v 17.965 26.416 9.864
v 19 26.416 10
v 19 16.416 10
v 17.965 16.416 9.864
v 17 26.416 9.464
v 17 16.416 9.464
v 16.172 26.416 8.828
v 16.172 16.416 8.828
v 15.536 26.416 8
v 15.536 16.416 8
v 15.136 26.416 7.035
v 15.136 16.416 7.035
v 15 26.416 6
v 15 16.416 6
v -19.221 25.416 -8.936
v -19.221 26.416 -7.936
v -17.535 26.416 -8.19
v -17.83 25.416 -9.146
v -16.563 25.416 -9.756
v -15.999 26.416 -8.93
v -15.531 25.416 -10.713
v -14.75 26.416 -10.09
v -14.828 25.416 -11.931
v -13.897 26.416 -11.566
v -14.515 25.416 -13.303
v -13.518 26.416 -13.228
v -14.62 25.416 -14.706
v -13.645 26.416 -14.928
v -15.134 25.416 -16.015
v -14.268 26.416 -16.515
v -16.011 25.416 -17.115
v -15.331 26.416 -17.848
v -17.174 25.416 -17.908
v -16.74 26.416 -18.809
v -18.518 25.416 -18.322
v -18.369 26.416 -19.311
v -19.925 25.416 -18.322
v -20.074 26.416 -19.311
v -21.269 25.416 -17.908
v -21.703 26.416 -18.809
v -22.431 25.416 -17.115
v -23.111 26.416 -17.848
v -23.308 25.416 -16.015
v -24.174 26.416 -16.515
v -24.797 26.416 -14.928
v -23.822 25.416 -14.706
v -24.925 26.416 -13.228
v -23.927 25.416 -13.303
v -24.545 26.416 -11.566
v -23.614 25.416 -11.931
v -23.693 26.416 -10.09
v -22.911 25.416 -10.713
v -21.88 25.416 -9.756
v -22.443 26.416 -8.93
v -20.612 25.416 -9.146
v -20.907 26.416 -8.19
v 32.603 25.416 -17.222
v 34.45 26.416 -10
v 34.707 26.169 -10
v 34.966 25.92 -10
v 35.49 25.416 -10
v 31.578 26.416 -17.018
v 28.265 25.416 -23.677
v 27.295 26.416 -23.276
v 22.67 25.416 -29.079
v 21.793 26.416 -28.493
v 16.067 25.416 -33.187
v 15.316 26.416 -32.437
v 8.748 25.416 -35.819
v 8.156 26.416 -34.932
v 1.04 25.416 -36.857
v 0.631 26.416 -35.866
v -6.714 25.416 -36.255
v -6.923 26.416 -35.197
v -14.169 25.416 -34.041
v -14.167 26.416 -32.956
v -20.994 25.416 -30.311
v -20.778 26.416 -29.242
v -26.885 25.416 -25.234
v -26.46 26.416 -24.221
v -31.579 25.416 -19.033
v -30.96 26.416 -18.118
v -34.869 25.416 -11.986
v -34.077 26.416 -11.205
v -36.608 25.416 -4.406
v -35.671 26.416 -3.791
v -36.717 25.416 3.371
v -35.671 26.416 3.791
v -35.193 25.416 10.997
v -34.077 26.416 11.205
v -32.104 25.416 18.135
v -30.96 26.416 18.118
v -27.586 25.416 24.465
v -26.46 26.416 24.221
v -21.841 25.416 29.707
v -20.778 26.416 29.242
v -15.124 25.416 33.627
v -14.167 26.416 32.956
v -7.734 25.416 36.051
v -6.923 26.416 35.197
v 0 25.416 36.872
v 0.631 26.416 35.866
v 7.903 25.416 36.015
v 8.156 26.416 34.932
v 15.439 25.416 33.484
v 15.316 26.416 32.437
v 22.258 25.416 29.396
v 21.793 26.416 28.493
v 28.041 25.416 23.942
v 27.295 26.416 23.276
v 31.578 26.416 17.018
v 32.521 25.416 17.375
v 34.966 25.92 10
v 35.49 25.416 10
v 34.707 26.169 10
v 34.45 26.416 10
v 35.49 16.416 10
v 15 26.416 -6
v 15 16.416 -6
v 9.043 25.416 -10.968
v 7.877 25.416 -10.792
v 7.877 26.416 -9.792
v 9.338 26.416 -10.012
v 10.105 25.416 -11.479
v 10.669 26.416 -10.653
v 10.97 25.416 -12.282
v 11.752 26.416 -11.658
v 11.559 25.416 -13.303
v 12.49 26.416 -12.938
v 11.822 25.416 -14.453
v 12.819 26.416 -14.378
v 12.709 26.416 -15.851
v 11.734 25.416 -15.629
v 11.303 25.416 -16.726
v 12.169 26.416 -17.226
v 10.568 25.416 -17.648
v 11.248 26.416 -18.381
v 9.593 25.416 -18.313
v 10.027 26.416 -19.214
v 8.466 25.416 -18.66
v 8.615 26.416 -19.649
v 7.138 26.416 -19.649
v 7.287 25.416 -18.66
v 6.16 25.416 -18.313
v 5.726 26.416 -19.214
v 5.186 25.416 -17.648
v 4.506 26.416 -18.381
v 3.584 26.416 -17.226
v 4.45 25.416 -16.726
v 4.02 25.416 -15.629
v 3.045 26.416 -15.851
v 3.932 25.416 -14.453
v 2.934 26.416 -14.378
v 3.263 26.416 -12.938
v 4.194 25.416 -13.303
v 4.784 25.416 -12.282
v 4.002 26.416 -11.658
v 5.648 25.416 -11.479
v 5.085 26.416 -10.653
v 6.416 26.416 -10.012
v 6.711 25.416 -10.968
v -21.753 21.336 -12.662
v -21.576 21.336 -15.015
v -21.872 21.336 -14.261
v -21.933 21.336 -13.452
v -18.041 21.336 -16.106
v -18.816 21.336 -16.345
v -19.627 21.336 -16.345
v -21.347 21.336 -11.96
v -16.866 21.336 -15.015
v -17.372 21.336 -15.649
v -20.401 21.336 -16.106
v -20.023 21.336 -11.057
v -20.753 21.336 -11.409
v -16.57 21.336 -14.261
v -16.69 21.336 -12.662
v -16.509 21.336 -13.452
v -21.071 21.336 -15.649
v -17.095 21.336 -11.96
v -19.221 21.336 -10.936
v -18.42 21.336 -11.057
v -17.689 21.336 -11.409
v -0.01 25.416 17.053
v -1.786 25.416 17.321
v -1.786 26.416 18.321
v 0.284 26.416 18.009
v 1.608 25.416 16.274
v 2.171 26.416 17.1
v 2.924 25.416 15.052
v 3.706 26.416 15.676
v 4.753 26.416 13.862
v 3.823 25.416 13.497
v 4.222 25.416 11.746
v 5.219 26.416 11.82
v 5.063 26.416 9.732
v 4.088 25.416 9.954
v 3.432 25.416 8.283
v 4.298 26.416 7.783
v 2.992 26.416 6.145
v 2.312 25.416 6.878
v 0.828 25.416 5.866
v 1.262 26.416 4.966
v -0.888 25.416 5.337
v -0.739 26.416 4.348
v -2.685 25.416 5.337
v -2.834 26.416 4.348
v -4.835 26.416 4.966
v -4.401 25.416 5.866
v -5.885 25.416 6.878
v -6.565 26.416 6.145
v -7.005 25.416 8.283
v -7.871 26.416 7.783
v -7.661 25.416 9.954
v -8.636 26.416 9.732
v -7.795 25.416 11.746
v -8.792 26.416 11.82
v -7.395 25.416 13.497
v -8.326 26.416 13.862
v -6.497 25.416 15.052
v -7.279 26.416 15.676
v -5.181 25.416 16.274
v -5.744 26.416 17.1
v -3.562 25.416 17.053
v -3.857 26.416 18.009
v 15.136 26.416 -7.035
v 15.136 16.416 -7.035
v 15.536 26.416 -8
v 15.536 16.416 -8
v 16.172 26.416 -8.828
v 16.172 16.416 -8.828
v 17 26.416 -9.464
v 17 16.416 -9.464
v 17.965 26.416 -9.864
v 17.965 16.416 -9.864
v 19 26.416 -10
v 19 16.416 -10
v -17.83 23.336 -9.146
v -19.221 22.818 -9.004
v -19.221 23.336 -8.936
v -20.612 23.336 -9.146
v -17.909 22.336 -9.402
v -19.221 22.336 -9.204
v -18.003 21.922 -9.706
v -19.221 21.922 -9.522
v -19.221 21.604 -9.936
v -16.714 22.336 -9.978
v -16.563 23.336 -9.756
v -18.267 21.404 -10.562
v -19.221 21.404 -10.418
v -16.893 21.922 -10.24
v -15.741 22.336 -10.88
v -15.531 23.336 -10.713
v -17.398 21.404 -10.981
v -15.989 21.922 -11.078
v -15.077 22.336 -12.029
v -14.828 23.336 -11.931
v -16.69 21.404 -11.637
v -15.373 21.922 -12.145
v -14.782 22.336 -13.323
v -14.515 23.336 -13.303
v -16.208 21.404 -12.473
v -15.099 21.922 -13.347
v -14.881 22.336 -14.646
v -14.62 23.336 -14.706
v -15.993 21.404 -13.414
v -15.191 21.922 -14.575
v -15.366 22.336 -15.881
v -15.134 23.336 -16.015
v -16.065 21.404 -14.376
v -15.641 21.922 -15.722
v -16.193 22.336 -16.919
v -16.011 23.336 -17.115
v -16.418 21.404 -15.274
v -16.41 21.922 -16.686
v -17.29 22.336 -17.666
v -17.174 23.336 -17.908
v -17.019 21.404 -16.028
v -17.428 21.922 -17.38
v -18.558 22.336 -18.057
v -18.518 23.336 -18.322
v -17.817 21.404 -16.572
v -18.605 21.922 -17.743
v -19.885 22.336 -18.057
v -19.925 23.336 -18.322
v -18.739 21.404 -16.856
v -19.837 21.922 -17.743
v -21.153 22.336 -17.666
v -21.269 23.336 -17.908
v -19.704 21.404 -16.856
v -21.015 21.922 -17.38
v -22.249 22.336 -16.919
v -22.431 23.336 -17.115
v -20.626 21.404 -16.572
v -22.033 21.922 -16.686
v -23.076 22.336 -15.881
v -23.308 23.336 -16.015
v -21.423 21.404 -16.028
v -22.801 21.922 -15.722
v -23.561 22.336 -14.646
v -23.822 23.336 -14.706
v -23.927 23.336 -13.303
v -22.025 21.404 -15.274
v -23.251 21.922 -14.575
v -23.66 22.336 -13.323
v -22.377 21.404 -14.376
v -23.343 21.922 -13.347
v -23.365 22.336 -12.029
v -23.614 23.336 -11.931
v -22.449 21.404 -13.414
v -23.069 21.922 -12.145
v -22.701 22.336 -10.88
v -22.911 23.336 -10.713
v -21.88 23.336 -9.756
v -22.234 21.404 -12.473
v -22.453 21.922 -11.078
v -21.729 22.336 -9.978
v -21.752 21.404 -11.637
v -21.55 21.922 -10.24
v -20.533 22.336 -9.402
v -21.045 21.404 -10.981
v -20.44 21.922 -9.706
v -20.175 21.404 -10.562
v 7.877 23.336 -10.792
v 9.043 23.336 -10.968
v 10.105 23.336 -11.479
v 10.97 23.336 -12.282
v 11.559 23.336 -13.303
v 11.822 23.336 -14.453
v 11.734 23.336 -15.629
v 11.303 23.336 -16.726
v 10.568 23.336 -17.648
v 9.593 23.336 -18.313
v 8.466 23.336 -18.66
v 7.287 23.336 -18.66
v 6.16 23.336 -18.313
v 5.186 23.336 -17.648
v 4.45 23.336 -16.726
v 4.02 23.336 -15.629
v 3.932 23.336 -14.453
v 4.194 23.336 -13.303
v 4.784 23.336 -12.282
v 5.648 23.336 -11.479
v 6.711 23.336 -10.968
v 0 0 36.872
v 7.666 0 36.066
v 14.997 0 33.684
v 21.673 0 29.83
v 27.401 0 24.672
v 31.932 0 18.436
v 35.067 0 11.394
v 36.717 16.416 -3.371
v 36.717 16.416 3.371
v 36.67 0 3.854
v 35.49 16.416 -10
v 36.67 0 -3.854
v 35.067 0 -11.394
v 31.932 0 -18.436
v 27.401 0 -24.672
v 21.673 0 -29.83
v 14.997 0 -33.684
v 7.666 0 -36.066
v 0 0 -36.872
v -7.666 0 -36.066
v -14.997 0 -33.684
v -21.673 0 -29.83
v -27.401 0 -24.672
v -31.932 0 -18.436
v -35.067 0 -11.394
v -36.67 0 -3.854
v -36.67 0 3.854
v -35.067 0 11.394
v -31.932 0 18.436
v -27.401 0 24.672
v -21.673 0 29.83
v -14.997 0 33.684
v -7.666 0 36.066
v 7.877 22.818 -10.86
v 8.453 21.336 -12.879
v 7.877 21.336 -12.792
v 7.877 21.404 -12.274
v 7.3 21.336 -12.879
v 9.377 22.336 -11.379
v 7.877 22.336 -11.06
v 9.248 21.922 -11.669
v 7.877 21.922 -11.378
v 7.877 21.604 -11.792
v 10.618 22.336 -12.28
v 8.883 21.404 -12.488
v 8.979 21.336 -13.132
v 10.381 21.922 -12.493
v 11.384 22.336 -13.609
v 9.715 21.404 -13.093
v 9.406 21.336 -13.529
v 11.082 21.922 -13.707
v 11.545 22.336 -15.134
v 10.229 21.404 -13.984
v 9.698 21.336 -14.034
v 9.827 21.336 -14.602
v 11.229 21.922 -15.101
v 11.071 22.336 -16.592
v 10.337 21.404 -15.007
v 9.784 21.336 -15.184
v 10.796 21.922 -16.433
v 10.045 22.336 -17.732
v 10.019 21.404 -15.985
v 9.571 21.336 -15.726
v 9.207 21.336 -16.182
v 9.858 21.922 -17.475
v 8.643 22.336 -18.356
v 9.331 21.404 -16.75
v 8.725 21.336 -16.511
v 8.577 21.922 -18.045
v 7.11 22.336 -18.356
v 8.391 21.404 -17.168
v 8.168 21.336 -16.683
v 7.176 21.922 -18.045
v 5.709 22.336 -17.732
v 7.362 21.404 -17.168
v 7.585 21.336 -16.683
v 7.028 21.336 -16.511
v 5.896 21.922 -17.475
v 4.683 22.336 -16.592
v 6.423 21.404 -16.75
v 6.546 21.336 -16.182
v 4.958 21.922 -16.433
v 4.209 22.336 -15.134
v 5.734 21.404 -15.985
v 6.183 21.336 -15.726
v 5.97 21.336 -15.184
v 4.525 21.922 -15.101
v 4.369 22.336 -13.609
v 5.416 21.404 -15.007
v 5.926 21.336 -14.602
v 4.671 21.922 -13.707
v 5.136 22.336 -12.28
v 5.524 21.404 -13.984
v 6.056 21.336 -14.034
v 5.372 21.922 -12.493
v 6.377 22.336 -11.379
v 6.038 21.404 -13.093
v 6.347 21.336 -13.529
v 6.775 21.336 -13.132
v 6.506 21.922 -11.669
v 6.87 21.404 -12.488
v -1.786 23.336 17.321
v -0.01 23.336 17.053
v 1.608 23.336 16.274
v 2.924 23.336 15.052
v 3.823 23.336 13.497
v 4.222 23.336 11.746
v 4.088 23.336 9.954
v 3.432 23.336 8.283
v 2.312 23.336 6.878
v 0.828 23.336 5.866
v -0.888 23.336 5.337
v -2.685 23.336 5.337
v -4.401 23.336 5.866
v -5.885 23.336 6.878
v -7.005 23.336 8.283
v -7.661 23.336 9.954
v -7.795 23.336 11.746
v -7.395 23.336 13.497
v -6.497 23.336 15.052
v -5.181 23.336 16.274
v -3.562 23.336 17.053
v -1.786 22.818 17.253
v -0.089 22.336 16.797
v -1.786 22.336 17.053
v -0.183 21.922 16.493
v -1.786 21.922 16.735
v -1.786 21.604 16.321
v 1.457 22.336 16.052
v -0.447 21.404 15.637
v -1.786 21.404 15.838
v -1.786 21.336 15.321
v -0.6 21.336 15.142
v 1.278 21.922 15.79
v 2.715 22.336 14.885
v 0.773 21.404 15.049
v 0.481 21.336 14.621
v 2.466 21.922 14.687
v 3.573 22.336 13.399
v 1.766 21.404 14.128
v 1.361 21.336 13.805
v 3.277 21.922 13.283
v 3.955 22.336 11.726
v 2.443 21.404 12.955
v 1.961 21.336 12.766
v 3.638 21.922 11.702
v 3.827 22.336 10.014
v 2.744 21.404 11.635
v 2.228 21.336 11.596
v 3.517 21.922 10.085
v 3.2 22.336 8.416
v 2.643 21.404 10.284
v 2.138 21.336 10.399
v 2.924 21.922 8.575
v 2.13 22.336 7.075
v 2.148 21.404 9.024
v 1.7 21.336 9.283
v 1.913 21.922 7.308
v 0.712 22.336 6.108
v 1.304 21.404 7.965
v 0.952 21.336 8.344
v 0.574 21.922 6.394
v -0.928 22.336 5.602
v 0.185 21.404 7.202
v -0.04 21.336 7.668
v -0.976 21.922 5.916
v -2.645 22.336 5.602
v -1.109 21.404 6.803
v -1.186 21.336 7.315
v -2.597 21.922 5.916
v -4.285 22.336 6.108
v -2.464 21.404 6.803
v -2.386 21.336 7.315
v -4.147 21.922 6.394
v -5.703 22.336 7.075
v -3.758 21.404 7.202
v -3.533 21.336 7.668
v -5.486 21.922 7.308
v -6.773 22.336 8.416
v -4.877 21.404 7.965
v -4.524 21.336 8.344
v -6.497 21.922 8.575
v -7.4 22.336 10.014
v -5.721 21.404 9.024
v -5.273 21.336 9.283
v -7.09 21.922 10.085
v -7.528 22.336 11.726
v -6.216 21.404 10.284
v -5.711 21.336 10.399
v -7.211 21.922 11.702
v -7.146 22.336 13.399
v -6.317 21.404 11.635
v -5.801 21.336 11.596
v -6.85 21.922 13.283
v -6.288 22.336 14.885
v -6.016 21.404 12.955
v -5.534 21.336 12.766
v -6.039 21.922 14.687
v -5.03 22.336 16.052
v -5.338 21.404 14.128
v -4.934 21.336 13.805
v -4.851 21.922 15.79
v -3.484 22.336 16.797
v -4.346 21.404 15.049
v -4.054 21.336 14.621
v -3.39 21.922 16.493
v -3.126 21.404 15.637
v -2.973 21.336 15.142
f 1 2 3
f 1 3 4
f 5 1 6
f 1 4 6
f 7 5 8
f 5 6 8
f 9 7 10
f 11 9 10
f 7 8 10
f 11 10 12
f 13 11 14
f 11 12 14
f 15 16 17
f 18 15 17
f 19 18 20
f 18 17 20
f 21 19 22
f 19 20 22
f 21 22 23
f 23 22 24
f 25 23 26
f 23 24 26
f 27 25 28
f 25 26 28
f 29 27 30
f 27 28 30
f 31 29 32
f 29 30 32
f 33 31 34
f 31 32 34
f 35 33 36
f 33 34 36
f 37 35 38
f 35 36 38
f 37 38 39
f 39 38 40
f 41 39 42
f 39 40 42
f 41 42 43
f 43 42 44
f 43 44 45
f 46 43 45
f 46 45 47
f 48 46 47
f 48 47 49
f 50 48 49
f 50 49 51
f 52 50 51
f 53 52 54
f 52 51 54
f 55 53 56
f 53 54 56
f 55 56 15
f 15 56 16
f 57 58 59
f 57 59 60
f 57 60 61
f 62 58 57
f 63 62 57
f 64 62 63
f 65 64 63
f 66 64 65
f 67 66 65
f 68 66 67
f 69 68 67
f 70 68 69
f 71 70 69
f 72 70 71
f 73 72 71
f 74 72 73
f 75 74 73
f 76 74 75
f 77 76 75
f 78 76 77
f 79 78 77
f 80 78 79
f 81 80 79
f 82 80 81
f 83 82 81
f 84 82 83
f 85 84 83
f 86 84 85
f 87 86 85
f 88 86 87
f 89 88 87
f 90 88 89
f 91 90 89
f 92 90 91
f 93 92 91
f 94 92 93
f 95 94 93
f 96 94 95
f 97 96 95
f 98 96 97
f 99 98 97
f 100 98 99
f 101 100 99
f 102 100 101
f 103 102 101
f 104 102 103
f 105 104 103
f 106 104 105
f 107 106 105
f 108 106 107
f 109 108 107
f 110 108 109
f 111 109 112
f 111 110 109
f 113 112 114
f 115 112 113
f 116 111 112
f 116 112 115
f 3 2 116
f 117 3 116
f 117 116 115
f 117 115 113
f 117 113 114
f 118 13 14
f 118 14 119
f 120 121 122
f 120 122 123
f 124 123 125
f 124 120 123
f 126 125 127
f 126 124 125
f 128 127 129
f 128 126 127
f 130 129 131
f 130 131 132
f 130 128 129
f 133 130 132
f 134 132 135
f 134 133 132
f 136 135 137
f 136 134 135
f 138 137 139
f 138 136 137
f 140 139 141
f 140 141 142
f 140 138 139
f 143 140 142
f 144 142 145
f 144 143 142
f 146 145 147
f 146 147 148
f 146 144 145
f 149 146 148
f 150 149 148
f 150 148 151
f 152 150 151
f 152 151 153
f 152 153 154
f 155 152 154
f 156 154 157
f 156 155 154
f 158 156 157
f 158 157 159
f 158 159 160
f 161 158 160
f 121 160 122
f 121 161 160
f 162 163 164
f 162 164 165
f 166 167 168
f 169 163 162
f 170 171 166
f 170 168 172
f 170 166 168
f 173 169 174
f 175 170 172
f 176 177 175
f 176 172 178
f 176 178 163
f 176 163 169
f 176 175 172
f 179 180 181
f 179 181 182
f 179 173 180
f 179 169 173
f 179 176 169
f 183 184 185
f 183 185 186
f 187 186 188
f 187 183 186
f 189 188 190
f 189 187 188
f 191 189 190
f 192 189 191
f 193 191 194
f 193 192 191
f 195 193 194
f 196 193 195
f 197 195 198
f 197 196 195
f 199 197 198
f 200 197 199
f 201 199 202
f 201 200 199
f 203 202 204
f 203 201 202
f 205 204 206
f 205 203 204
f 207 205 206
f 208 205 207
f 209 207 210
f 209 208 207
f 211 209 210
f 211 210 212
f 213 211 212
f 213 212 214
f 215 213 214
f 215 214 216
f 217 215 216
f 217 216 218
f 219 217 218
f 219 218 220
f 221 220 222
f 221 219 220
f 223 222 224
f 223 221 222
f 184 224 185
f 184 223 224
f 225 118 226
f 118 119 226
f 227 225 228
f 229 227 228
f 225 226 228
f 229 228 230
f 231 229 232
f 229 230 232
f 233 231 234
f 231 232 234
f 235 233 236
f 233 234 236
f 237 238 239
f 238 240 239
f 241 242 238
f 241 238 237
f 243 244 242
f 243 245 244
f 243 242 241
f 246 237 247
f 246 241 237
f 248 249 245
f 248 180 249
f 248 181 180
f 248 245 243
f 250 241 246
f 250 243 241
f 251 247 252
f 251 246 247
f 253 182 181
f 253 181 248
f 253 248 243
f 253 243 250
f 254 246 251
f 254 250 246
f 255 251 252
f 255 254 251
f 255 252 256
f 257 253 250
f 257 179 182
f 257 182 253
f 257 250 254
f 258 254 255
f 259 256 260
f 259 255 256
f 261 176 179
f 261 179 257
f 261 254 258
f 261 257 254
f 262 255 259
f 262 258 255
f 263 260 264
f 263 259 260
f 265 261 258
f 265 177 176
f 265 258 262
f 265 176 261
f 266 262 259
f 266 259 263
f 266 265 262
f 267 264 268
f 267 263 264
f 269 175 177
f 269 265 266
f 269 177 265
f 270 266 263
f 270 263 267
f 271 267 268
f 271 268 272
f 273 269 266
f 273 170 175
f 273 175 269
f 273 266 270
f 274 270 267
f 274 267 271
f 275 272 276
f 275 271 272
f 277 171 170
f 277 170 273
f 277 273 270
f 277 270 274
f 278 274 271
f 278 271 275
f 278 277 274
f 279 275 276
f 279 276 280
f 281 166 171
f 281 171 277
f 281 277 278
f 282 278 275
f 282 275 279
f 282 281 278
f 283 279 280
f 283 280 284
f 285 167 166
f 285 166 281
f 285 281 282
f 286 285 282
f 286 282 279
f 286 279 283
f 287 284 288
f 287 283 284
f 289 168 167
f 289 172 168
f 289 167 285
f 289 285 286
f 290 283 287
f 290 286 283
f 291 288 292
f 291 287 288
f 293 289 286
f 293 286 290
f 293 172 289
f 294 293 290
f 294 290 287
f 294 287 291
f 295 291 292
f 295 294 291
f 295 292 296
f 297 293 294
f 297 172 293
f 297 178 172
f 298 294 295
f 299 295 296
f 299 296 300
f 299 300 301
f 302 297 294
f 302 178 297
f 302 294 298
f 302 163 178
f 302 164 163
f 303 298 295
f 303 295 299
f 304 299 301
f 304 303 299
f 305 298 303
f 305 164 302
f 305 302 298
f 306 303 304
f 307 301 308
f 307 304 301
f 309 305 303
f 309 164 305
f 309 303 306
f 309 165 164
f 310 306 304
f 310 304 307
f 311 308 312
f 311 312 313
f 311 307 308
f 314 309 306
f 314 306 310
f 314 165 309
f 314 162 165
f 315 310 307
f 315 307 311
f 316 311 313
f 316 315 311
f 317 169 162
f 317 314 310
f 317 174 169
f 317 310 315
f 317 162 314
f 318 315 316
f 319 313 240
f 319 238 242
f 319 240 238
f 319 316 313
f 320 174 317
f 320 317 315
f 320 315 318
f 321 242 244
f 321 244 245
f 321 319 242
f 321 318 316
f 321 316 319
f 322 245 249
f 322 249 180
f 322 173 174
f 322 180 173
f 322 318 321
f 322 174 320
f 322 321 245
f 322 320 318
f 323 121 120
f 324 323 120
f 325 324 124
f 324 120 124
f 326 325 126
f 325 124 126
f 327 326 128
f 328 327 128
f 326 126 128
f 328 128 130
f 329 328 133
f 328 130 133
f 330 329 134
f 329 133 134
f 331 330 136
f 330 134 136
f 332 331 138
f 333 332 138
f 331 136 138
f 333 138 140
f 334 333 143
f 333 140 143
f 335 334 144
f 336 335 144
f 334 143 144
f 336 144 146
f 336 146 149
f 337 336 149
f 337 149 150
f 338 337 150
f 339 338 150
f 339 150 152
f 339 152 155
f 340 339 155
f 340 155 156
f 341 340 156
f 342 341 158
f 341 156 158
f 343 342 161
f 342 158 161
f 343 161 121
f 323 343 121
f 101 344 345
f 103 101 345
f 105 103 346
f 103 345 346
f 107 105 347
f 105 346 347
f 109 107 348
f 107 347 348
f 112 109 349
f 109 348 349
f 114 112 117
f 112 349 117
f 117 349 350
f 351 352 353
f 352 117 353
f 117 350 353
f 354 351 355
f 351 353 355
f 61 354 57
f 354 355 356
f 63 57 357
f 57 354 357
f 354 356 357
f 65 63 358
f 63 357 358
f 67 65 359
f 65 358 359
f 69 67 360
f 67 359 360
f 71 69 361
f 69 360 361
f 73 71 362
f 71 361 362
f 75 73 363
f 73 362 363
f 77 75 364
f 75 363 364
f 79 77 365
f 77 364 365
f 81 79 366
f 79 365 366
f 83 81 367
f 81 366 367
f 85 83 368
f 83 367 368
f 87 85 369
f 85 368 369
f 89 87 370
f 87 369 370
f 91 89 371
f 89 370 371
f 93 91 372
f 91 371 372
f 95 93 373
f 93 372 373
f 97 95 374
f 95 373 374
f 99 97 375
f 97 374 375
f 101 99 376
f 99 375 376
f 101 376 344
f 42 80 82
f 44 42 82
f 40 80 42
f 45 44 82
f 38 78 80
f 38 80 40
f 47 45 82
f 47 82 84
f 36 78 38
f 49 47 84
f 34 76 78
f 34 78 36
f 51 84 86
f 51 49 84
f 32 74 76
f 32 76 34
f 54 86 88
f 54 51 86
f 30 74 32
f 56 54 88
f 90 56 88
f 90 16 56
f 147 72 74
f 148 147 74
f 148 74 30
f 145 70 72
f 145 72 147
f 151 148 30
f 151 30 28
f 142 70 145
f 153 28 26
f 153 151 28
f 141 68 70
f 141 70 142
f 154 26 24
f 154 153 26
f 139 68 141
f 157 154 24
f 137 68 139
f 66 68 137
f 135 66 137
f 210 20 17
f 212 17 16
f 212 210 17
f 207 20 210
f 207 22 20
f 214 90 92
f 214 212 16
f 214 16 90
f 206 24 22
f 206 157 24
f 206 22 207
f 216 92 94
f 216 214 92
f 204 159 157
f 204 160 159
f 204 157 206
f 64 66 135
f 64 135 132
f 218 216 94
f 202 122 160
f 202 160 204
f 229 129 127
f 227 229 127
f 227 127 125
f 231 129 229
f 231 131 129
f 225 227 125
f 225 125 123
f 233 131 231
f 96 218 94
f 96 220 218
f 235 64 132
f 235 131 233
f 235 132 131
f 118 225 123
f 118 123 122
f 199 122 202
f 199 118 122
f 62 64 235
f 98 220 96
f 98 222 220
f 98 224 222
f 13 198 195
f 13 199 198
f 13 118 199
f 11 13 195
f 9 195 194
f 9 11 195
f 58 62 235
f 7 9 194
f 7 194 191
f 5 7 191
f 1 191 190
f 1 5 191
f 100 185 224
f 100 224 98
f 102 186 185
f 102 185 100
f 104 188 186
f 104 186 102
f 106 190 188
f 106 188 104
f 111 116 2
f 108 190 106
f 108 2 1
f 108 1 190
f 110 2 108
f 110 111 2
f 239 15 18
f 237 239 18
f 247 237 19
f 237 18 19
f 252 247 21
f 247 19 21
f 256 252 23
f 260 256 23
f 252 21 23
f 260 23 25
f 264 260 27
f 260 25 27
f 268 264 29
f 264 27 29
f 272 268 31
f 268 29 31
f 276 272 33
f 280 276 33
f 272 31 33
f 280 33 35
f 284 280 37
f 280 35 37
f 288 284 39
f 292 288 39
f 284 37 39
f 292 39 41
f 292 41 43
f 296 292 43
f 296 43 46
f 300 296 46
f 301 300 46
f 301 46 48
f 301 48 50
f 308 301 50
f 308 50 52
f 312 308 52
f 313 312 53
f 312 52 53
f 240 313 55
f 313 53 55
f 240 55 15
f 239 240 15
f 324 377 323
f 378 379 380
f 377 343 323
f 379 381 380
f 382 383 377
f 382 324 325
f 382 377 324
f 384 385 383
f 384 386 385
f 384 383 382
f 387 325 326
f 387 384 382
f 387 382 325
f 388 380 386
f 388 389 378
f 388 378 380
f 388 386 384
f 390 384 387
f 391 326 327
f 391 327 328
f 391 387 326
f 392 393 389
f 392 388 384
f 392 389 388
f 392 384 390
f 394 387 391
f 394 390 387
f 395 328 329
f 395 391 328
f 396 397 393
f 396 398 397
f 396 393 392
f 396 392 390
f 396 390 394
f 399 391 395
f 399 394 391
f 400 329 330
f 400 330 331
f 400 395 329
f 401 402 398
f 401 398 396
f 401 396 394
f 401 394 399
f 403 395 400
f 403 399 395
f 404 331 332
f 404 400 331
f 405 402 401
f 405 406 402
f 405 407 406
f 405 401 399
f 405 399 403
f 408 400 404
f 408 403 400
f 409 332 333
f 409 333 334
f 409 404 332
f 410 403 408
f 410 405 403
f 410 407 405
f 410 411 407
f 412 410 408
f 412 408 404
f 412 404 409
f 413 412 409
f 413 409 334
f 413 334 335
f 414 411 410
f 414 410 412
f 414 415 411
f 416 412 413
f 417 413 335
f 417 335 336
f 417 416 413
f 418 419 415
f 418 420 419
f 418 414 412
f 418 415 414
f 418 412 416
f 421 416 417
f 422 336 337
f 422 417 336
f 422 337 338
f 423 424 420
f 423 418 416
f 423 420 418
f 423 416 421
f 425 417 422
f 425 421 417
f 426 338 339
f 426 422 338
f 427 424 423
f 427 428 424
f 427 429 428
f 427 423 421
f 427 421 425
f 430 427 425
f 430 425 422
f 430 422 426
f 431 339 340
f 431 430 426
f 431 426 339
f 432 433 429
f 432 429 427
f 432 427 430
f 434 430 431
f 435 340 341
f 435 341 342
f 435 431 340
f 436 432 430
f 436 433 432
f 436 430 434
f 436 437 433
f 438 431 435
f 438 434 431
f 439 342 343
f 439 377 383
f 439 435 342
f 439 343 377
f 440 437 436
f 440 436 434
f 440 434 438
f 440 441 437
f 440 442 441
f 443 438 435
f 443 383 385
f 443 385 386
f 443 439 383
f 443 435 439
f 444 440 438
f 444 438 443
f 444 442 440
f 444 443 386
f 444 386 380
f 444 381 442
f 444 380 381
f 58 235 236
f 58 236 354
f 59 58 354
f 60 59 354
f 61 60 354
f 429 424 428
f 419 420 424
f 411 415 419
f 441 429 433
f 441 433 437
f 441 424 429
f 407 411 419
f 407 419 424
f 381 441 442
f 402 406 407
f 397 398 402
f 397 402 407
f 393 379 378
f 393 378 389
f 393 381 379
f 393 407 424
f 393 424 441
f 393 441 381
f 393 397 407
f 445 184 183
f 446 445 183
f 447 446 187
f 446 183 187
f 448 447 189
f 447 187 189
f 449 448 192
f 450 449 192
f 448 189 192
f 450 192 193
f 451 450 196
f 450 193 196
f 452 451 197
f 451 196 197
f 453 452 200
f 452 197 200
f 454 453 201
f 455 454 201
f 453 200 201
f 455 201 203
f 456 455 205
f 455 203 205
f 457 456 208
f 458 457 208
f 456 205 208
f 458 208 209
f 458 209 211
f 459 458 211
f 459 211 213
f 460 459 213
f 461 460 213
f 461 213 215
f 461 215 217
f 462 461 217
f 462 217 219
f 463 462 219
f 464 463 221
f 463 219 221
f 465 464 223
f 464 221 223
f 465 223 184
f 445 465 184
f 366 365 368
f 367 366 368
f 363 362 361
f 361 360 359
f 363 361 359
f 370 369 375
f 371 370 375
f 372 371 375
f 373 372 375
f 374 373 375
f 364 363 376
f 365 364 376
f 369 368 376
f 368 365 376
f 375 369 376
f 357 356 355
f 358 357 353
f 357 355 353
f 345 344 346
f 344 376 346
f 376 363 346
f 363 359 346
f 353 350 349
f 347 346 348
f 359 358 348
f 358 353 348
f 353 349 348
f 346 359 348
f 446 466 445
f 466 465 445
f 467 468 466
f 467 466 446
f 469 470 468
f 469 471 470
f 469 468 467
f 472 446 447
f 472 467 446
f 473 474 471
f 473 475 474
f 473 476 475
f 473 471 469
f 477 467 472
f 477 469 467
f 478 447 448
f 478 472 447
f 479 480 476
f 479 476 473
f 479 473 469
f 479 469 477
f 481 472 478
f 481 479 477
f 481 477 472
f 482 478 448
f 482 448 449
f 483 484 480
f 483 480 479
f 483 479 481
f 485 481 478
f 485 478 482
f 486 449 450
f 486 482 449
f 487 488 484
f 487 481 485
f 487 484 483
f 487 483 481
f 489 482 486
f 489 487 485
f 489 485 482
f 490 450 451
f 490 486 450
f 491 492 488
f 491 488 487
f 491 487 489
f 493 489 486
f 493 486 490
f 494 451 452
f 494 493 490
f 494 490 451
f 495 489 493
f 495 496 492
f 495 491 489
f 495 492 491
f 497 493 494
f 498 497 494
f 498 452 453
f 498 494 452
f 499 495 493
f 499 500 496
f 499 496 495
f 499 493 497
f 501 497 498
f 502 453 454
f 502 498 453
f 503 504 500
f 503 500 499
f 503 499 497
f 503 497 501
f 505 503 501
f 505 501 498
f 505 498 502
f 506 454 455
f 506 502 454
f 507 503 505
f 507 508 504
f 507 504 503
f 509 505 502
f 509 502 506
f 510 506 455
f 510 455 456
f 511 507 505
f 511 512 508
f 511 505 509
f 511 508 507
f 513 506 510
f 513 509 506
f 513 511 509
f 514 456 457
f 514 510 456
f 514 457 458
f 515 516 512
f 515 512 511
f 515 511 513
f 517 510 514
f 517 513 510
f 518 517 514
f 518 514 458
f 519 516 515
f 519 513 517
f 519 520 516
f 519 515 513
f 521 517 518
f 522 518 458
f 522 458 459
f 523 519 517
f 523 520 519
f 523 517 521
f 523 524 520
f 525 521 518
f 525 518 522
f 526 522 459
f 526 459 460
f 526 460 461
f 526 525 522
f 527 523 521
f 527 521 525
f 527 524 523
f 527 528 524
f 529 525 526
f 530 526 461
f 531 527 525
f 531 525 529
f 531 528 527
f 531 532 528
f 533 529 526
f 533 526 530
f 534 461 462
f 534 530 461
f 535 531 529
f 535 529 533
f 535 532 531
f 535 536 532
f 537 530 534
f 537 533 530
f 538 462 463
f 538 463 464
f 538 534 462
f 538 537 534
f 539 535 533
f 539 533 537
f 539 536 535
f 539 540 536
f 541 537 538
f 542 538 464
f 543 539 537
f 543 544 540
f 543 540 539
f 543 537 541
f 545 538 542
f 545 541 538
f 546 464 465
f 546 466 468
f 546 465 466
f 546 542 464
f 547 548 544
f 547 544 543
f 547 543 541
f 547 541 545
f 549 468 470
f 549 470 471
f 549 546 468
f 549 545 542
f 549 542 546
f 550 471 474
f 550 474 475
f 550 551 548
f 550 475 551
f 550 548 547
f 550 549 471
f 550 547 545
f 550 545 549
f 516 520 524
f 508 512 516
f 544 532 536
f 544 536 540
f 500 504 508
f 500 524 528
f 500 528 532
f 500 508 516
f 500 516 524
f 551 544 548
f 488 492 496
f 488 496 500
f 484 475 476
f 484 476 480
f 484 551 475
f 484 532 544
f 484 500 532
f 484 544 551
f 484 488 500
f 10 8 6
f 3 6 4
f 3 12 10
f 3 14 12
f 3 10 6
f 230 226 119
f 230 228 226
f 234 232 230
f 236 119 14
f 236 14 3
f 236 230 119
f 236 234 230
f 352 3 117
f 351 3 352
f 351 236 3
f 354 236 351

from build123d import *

# Parameters (mm, degrees)
SKETCH1_R           = 36.871673704
BOSS_EXTRUDE1_DEPTH = 26.416
SKETCH2_R           = 4.719401224
SKETCH2_R_2         = 3.956193561
SKETCH2_R_3         = 6.025487418
CUT_EXTRUDE1_DEPTH  = 5.08
CHAMFER1_SIZE       = 1
SKETCH4_W           = 30
SKETCH4_H           = 20
CUT_EXTRUDE2_DEPTH  = 10
FILLET1_R           = 4
FILLET3_R           = 2
CHAMFER3_SIZE       = 1


with BuildPart() as part:
    # Sketch1 → Boss-Extrude1 (new body)
    with BuildSketch(Plane(origin=(0, 0, 0), x_dir=(1, 0, 0), z_dir=(0, 1, 0))):
        with Locations(Location((0, 0, 0), (0, 0, 270))):  # turned: the seam where the file's is
            Circle(SKETCH1_R)
    extrude(amount=BOSS_EXTRUDE1_DEPTH)

    # Sketch2 → Cut-Extrude1 (cut)
    with BuildSketch(Plane(origin=(0, 26.416, 0), x_dir=(1, 0, 0), z_dir=(0, 1, 0))):
        with Locations(Location((-19.22121176, 13.655520005, 0), (0, 0, 270))):  # turned: the seam where the file's is
            Circle(SKETCH2_R)
        with Locations(Location((7.876648873, 14.748238638, 0), (0, 0, 270))):  # turned: the seam where the file's is
            Circle(SKETCH2_R_2)
        with Locations(Location((-1.786448021, -11.295248686, 0), (0, 0, 270))):  # turned: the seam where the file's is
            Circle(SKETCH2_R_3)
    extrude(amount=-CUT_EXTRUDE1_DEPTH, mode=Mode.SUBTRACT)

    # Chamfer1
    chamfer1_edges = [part.edges().sort_by_distance(p)[0] for p in [
        (0, 26.416, -36.871673704),
    ]]
    chamfer(chamfer1_edges, length=CHAMFER1_SIZE)

    # Sketch4 → Cut-Extrude2 (cut)
    with BuildSketch(Plane(origin=(0, 26.416, 0), x_dir=(1, 0, 0), z_dir=(0, 1, 0))):
        with Locations((30, 0)):
            Rectangle(SKETCH4_W, SKETCH4_H)
    extrude(amount=-CUT_EXTRUDE2_DEPTH, mode=Mode.SUBTRACT)

    # Fillet1
    fillet1_edges = [part.edges().sort_by_distance(p)[0] for p in [
        (15, 21.416, -10),
        (15, 21.416, 10),
    ]]
    fillet(fillet1_edges, radius=FILLET1_R)

    # Fillet3
    fillet3_edges = [part.edges().sort_by_distance(p)[0] for p in [
        (-1.786448021, 21.336, 5.269761268),
        (-19.22121176, 21.336, -18.374921228),
        (7.876648873, 21.336, -18.7044322),
    ]]
    fillet(fillet3_edges, radius=FILLET3_R)

    # Chamfer3
    chamfer3_edges = [part.edges().sort_by_distance(p)[0] for p in [
        (-1.786448021, 26.416, 5.269761268),
        (-19.22121176, 26.416, -18.374921228),
        (7.876648873, 26.416, -18.7044322),
    ]]
    chamfer(chamfer3_edges, length=CHAMFER3_SIZE)


solid = part.part
